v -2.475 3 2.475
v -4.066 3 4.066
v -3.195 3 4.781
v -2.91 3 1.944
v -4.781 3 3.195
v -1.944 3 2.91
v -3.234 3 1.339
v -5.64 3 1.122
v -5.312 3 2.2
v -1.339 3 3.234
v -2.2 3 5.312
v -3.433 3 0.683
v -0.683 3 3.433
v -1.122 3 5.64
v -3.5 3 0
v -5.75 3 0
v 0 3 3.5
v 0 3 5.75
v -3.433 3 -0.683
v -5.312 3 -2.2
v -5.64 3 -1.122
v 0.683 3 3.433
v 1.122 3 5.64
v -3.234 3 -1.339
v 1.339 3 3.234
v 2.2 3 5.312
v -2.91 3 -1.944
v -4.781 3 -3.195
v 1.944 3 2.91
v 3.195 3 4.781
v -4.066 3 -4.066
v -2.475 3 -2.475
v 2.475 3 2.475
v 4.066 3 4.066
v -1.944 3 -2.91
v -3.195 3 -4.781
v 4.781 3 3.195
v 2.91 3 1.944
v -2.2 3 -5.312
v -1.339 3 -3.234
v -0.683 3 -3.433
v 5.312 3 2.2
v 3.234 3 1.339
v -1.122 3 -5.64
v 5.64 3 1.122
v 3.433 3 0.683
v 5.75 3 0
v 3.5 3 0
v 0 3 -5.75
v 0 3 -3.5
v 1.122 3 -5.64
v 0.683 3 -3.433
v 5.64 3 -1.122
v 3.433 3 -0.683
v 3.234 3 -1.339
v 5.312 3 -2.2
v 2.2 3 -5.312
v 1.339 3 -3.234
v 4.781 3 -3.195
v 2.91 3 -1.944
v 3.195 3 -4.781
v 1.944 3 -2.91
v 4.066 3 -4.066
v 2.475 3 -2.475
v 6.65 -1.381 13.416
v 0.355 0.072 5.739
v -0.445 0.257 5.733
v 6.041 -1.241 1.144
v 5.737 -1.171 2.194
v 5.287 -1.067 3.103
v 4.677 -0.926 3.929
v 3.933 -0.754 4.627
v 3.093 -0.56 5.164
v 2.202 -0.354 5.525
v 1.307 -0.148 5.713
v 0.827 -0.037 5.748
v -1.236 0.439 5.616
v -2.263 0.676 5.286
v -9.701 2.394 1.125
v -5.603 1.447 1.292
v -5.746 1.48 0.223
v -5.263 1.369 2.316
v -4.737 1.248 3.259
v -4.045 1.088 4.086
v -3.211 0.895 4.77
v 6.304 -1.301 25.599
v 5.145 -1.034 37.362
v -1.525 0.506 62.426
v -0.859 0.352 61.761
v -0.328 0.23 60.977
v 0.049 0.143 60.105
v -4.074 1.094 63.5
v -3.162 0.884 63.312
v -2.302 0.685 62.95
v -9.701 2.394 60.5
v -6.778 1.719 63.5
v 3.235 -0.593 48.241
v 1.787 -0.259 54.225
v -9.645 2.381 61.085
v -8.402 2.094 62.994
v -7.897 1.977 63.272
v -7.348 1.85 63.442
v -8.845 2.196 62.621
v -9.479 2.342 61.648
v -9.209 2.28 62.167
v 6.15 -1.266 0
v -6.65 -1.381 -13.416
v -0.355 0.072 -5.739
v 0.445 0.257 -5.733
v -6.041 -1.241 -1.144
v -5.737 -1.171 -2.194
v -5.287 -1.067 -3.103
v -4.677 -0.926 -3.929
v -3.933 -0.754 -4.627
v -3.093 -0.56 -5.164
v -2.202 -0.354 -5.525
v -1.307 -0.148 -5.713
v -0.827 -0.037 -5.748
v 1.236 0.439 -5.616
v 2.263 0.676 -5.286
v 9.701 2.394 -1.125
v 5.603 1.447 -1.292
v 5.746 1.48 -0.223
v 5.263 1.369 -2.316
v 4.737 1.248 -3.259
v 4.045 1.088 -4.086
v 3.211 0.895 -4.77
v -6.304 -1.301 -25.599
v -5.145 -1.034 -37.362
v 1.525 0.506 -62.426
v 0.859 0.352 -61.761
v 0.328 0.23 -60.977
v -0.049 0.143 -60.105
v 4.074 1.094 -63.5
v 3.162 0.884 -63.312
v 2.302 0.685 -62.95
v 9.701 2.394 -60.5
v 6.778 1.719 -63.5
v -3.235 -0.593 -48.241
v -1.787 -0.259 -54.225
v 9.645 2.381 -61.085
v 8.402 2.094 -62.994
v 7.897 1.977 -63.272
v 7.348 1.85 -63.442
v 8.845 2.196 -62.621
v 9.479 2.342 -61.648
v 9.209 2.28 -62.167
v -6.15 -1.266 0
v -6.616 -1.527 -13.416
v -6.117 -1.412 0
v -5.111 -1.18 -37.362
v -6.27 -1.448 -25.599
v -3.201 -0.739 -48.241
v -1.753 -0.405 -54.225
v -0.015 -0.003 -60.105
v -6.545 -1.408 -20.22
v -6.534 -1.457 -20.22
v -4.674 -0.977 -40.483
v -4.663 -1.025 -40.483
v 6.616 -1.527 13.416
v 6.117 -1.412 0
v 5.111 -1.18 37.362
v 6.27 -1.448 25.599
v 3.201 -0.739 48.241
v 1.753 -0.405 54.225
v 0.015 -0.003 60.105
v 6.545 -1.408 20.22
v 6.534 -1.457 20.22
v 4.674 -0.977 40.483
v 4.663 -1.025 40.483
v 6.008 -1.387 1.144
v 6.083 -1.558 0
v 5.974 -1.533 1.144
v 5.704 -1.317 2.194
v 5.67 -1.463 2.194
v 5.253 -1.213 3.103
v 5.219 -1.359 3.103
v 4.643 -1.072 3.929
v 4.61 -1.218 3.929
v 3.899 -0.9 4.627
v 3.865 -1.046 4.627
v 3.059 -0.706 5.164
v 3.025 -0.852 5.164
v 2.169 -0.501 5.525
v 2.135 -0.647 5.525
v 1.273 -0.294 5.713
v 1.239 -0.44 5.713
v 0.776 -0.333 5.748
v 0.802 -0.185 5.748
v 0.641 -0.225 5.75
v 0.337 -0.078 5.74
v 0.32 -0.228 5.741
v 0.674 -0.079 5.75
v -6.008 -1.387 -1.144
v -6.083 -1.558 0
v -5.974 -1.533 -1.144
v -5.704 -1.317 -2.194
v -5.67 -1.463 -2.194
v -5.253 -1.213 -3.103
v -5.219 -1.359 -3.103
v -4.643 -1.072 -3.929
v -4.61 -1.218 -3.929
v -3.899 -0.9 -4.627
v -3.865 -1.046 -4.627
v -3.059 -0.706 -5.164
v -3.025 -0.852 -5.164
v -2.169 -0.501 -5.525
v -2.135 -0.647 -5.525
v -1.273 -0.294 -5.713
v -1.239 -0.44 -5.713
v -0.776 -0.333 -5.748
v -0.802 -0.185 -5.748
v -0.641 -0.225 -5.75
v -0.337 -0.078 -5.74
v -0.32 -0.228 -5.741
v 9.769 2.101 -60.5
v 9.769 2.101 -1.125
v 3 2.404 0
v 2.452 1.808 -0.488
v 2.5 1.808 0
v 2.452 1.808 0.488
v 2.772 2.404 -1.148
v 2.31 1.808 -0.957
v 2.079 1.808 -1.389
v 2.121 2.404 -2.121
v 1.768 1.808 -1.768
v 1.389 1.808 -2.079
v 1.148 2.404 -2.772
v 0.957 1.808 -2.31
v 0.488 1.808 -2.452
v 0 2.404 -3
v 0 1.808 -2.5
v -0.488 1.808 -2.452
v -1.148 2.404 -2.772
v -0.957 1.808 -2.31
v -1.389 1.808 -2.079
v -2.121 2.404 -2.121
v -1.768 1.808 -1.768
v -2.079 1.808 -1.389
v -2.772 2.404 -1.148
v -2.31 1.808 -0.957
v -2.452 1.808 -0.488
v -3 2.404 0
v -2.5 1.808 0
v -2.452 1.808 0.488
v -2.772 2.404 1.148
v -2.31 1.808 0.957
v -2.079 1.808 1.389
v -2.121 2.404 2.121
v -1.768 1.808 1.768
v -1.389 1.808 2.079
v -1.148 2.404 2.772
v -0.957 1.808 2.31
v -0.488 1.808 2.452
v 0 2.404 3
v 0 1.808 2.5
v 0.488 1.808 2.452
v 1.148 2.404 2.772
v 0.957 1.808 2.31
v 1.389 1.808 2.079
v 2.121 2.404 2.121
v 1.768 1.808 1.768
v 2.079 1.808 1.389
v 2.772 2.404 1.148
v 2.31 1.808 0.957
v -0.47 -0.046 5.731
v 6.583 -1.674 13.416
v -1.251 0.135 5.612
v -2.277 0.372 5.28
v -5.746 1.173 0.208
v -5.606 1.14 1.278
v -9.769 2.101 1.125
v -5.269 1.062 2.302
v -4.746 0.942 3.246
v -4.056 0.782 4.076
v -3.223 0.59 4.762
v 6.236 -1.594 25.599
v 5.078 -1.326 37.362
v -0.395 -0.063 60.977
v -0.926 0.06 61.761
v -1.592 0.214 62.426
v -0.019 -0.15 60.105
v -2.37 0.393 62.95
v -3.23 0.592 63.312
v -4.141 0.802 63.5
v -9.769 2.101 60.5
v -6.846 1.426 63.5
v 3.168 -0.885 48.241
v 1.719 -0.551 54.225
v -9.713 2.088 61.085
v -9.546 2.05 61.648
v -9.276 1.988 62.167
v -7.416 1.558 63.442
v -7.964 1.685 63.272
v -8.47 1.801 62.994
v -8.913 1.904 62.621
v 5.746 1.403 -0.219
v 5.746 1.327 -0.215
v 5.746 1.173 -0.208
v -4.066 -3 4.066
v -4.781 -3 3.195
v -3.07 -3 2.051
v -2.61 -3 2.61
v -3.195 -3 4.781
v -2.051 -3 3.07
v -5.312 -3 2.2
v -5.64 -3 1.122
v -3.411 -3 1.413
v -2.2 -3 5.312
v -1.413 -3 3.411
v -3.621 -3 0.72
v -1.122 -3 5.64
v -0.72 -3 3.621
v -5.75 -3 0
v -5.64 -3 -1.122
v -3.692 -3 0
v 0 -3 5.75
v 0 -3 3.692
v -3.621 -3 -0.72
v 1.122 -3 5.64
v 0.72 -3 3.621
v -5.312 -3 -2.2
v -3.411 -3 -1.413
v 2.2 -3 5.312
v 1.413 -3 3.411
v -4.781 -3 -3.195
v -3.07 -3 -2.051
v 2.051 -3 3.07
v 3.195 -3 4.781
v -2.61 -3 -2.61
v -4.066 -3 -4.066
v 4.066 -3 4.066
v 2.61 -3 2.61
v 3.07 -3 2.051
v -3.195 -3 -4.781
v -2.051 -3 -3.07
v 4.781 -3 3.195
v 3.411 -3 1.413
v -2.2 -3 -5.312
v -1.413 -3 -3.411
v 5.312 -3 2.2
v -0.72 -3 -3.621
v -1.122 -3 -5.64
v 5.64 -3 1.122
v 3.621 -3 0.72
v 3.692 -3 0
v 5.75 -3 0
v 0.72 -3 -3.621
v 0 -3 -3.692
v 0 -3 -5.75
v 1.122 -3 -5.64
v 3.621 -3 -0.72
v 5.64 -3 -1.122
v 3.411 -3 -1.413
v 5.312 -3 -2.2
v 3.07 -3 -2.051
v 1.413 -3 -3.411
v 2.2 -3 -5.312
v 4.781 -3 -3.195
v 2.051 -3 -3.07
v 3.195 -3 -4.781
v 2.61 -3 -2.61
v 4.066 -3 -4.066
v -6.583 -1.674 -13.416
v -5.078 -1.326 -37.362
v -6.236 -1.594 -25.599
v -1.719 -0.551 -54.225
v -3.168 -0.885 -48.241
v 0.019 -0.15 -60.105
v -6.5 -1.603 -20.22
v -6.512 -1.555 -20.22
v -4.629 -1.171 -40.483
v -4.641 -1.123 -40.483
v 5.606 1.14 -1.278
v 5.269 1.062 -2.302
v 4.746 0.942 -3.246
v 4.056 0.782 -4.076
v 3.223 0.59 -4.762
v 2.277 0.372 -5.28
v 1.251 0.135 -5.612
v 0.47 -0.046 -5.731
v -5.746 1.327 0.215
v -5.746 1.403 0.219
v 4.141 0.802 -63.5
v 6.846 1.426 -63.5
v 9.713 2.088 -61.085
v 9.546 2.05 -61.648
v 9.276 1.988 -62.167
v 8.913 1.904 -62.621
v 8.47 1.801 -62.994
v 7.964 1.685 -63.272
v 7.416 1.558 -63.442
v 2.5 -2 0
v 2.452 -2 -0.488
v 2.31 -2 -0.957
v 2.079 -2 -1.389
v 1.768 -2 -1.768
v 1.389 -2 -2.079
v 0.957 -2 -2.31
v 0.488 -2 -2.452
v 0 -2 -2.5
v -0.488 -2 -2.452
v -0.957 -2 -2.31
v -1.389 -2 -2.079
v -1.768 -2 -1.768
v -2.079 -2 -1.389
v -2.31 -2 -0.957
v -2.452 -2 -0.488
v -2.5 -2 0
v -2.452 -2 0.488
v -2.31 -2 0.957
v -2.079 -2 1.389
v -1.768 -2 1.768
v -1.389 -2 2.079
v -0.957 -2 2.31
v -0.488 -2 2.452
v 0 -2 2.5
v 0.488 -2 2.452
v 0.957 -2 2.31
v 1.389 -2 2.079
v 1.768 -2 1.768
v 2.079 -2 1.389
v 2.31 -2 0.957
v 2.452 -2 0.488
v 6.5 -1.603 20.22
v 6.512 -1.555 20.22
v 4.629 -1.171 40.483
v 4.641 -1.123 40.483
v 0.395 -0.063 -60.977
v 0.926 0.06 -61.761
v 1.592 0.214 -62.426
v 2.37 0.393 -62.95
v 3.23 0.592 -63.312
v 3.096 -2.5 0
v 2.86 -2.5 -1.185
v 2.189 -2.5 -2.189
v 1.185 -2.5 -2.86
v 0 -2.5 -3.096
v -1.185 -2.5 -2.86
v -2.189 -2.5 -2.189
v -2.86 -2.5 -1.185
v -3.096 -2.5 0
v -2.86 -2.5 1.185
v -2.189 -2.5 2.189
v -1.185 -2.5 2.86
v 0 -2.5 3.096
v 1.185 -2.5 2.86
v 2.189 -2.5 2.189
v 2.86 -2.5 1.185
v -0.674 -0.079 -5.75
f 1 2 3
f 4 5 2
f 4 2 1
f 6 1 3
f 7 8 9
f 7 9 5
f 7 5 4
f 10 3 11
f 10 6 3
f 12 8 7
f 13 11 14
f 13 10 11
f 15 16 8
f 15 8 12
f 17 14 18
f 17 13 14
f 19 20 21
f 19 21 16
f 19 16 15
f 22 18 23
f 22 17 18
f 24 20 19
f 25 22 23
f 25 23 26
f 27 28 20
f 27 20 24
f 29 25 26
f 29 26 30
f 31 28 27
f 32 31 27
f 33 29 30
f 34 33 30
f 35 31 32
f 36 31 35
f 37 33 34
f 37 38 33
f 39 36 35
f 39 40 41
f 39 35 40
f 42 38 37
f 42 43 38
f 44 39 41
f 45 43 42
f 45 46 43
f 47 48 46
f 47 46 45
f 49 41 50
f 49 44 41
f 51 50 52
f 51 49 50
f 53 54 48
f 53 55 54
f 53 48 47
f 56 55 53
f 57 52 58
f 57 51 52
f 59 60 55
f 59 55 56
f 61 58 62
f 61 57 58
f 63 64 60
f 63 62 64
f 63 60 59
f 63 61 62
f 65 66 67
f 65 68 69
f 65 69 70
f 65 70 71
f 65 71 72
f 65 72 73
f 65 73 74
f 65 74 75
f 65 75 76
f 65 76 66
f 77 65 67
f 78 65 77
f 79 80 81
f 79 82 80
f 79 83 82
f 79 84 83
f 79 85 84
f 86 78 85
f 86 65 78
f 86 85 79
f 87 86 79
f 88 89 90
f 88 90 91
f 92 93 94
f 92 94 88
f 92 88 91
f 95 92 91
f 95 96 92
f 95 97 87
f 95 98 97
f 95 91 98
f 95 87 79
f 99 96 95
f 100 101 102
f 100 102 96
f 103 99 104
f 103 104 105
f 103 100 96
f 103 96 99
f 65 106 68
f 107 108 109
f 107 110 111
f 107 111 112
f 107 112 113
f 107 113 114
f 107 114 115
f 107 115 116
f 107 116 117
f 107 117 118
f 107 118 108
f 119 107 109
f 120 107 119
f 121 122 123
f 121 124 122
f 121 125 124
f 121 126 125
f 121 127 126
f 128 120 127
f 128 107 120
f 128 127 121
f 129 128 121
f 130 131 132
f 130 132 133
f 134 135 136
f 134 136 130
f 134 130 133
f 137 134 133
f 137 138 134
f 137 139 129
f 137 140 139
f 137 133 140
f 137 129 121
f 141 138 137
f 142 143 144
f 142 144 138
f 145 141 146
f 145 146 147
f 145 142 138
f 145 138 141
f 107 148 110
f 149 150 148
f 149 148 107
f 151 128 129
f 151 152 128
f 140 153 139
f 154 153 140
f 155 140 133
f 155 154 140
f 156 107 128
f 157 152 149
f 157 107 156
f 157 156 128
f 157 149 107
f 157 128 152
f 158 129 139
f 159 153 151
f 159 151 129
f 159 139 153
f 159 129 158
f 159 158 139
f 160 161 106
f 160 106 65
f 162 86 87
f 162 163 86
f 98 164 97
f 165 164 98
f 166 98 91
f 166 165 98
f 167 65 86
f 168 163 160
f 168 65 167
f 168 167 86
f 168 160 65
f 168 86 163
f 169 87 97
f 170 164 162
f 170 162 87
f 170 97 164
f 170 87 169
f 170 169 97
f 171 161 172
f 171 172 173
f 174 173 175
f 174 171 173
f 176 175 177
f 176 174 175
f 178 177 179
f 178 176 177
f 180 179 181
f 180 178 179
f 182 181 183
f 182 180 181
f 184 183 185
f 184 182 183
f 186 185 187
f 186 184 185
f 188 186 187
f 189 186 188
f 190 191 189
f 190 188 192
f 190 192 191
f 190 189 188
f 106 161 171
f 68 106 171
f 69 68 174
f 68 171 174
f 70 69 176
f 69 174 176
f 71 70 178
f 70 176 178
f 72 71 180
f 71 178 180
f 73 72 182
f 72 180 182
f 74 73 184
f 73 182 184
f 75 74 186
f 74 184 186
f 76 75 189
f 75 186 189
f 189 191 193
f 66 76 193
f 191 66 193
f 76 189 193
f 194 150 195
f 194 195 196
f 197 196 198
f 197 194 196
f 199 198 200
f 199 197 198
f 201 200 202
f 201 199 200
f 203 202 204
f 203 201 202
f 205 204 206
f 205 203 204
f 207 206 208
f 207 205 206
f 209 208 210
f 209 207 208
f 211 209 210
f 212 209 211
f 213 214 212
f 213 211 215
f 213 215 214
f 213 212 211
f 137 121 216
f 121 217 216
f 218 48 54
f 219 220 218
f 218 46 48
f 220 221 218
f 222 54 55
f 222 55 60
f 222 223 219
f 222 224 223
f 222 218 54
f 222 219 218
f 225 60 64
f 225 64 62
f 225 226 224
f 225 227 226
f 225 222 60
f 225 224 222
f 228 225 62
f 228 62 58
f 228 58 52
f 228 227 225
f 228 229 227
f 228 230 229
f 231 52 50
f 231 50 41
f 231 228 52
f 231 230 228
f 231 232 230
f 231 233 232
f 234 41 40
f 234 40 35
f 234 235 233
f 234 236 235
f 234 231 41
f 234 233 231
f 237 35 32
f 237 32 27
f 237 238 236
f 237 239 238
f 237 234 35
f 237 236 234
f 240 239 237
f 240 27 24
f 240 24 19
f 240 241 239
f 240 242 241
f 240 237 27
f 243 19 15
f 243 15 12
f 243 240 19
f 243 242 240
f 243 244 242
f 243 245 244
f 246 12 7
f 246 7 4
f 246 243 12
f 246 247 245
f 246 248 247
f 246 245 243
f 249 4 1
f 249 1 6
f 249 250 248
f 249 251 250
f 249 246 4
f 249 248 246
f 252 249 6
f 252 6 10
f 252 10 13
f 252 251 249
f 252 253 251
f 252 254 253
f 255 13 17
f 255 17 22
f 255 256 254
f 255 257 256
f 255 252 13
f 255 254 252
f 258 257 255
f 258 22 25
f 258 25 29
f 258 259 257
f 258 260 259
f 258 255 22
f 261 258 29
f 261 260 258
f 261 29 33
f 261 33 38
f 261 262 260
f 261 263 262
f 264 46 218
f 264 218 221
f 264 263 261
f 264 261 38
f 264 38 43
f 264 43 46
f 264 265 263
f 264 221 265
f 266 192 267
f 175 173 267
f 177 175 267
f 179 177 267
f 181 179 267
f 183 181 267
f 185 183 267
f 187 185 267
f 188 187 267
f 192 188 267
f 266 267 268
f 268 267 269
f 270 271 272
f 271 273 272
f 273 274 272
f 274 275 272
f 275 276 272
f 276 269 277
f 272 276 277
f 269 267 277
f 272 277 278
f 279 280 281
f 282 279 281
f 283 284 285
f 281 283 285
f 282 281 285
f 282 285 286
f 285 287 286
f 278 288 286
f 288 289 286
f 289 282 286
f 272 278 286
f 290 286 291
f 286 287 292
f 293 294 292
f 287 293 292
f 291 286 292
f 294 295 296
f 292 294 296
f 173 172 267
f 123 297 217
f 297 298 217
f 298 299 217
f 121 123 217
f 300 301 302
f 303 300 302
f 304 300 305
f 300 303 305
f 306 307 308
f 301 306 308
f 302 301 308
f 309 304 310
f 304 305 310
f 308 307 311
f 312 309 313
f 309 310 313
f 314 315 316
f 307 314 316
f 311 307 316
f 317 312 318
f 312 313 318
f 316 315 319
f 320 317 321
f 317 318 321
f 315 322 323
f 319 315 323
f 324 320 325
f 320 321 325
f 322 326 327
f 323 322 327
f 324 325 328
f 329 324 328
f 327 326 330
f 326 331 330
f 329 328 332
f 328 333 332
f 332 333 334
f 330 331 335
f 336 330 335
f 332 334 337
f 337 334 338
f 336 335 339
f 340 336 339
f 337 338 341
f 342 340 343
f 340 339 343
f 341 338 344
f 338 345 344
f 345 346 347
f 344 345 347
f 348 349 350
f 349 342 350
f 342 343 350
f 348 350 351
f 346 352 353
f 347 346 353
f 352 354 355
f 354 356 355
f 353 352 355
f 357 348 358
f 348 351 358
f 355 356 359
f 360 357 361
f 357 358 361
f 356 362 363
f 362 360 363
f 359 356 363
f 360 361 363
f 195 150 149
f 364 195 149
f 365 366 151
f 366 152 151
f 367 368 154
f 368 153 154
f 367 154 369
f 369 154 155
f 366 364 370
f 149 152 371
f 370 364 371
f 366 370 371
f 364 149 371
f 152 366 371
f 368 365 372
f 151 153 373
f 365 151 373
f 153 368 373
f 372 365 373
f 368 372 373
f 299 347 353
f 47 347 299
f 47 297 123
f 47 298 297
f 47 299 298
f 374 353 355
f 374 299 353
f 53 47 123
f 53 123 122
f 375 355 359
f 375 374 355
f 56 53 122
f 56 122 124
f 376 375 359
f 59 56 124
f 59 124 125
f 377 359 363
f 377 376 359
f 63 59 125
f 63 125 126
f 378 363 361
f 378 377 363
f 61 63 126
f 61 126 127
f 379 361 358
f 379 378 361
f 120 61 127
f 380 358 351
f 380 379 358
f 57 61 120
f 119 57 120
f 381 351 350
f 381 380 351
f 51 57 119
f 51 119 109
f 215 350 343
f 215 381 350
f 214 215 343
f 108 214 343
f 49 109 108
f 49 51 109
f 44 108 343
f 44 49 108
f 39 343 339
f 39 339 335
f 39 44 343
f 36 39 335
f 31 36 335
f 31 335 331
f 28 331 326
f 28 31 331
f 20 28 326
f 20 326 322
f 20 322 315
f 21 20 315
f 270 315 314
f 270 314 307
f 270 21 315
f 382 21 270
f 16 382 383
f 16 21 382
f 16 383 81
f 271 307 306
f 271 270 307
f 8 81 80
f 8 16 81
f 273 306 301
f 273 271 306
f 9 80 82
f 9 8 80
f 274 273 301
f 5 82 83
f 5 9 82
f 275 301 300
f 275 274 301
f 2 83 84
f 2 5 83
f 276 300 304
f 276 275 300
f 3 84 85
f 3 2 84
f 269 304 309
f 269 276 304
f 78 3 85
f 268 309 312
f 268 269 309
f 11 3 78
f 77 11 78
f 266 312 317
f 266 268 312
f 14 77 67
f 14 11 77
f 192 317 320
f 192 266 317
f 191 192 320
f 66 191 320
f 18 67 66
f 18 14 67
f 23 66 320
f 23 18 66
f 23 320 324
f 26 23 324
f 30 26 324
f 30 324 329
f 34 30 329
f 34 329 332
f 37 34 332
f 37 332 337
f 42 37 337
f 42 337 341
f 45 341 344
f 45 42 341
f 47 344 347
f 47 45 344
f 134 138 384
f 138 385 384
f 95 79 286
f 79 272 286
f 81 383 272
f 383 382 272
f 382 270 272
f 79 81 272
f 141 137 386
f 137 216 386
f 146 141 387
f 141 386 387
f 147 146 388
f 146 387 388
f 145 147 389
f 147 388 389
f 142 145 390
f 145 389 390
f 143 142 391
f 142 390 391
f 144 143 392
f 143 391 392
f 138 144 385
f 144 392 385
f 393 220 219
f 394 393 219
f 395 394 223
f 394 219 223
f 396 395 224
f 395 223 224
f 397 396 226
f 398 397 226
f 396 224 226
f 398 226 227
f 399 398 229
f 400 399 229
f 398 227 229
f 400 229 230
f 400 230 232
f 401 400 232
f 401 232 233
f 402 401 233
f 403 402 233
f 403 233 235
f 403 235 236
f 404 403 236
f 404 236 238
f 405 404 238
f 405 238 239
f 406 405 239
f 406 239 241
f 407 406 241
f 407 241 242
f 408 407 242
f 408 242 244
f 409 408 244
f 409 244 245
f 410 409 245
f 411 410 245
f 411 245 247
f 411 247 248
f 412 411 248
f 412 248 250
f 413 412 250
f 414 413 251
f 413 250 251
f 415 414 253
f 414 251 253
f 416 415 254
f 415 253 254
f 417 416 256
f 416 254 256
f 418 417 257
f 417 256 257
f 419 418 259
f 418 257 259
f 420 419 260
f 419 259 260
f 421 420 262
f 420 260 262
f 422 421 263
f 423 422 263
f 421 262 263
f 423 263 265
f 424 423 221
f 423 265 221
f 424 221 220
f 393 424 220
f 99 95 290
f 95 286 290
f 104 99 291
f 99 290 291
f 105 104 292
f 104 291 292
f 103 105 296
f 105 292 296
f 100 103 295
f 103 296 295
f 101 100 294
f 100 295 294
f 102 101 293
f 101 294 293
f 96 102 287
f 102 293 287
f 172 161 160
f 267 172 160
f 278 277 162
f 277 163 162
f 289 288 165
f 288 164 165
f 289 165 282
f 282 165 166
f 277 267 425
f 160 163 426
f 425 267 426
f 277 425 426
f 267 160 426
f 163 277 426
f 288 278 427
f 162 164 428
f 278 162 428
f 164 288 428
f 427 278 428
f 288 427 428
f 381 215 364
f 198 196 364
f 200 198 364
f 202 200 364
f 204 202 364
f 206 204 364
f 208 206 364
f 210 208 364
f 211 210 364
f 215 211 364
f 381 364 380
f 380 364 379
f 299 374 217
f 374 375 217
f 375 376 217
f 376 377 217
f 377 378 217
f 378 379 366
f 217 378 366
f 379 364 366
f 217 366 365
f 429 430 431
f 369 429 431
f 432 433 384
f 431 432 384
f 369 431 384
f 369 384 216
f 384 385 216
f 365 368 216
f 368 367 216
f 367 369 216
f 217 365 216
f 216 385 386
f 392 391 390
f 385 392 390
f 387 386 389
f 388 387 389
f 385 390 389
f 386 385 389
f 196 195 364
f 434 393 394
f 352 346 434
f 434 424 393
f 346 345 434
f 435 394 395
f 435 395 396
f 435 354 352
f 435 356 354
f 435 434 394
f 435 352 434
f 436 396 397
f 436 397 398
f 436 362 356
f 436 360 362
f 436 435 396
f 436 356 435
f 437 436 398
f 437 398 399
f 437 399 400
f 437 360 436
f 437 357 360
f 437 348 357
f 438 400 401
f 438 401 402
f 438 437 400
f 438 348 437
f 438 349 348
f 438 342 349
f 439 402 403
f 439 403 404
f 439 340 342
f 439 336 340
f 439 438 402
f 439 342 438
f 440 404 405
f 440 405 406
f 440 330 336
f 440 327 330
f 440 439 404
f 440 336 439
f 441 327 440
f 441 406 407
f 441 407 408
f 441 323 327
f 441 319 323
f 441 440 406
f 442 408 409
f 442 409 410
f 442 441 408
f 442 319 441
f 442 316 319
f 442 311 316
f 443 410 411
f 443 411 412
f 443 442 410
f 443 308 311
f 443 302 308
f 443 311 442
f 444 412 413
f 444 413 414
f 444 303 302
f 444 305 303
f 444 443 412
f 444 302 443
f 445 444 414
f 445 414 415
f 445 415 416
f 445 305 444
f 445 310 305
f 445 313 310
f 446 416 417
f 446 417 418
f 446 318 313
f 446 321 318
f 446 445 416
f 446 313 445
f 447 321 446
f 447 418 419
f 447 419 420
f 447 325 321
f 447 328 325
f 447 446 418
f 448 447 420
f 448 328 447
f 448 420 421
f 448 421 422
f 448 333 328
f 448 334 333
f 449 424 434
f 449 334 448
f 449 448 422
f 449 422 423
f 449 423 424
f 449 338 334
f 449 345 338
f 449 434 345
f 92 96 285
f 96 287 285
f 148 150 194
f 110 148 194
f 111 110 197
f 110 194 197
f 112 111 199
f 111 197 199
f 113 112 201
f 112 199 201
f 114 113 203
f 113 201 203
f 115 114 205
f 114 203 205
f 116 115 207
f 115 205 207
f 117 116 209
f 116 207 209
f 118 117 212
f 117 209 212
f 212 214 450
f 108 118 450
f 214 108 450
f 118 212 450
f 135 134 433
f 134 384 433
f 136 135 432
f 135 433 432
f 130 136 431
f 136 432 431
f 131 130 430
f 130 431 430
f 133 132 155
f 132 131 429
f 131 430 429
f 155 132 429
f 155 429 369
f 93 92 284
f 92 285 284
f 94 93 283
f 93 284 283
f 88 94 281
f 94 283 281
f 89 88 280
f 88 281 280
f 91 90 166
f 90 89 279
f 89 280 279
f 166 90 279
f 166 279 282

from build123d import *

# Parameters (mm, degrees)
SKETCH2_R             = 5.75
BOSS_EXTRUDE1_DEPTH   = 3
BOSS_EXTRUDE2_DEPTH   = 0.15
CIRPATTERN1_COUNT     = 2
SKETCH5_R             = 2.5
CUT_EXTRUDE1_DEPTH    = 7.0000001
CHAMFER1_SIZE         = 1
CHAMFER1_SIZE2        = 1.191753593
CHAMFER1_PART_2_SIZE  = 1
CHAMFER1_PART_2_SIZE2 = 1.191753593


with BuildPart() as part:
    # Sketch2 → Boss-Extrude1 (new body, symmetric)
    with BuildSketch(Plane(origin=(0, 0, 0), x_dir=(1, 0, 0), z_dir=(0, 1, 0))):
        Circle(SKETCH2_R)
    extrude(amount=BOSS_EXTRUDE1_DEPTH, both=True)

    # Sketch4 → Boss-Extrude2 (add, symmetric)
    with BuildSketch(Plane(origin=(0, 0, 0), x_dir=(0.974370065, -0.224951054, 0), z_dir=(-0.224951054, -0.974370065, 0))):
        with BuildLine():
            Line((-4.927774709, 0), (-9.991003068, 1.124716583))
            Line((-9.991003068, 1.124716583), (-9.991003068, 60.5))
            ThreePointArc((-9.991003068, 60.5), (-9.112323412, 62.621320344), (-6.991003068, 63.5))
            Line((-6.991003068, 63.5), (-4.215686073, 63.5))
            ThreePointArc((-4.215686073, 63.5), (-1.599645431, 62.426082199), (0.015394976, 60.10474367))
            add(Edge.make_bspline(
                [(6.277481036, 0), (7.695955288, 19.970569662), (6.360815362, 41.03083372), (0.015394976, 60.10474367)],
                knots=[0, 0, 0, 0, 0.936918572, 0.936918572, 0.936918572, 0.936918572], degree=3))
            add(Edge.make_bspline(
                [(6.277481036, 0), (6.277481036, 5.75), (0.674853163, 5.75), (-4.927774709, 5.75), (-4.927774709, 0)],
                knots=[4.71238898, 4.71238898, 4.71238898, 6.283185307, 6.283185307, 7.853981634, 7.853981634, 7.853981634], degree=2, weights=[1, 0.707106781, 1, 0.707106781, 1]))
        make_face()
    boss_extrude2 = extrude(amount=BOSS_EXTRUDE2_DEPTH, both=True)

    # CirPattern1: Boss-Extrude2 ×2 about axis
    cirpattern1_axis = Axis((0, 3, 0), (0, -1, 0))
    for i in range(1, CIRPATTERN1_COUNT):
        add(boss_extrude2.rotate(cirpattern1_axis, i * 360 / CIRPATTERN1_COUNT))

    # Sketch5 → Cut-Extrude1 (cut, through all)
    with BuildSketch(Plane(origin=(0, 3, 0), x_dir=(1, 0, 0), z_dir=(0, 1, 0))):
        Circle(SKETCH5_R)
    extrude(amount=-CUT_EXTRUDE1_DEPTH, mode=Mode.SUBTRACT)

    # Chamfer1
    chamfer1_edges = [part.edges().sort_by_distance(p)[0] for p in [
        (-2.5, -3, 0),
    ]]
    chamfer1_side = [part.faces().sort_by_distance(p)[0] for p in [
        (-2.5, 0, 0),
    ]]
    chamfer(chamfer1_edges, length=CHAMFER1_SIZE, length2=CHAMFER1_SIZE2, reference=chamfer1_side[0])

    # Chamfer1 part 2
    chamfer1_part_2_edges = [part.edges().sort_by_distance(p)[0] for p in [
        (-2.5, 3, 0),
    ]]
    chamfer1_part_2_side = [part.faces().sort_by_distance(p)[0] for p in [
        (-5.58736544, 3, 0),
    ]]
    chamfer(chamfer1_part_2_edges, length=CHAMFER1_PART_2_SIZE, length2=CHAMFER1_PART_2_SIZE2, reference=chamfer1_part_2_side[0])


solid = part.part
